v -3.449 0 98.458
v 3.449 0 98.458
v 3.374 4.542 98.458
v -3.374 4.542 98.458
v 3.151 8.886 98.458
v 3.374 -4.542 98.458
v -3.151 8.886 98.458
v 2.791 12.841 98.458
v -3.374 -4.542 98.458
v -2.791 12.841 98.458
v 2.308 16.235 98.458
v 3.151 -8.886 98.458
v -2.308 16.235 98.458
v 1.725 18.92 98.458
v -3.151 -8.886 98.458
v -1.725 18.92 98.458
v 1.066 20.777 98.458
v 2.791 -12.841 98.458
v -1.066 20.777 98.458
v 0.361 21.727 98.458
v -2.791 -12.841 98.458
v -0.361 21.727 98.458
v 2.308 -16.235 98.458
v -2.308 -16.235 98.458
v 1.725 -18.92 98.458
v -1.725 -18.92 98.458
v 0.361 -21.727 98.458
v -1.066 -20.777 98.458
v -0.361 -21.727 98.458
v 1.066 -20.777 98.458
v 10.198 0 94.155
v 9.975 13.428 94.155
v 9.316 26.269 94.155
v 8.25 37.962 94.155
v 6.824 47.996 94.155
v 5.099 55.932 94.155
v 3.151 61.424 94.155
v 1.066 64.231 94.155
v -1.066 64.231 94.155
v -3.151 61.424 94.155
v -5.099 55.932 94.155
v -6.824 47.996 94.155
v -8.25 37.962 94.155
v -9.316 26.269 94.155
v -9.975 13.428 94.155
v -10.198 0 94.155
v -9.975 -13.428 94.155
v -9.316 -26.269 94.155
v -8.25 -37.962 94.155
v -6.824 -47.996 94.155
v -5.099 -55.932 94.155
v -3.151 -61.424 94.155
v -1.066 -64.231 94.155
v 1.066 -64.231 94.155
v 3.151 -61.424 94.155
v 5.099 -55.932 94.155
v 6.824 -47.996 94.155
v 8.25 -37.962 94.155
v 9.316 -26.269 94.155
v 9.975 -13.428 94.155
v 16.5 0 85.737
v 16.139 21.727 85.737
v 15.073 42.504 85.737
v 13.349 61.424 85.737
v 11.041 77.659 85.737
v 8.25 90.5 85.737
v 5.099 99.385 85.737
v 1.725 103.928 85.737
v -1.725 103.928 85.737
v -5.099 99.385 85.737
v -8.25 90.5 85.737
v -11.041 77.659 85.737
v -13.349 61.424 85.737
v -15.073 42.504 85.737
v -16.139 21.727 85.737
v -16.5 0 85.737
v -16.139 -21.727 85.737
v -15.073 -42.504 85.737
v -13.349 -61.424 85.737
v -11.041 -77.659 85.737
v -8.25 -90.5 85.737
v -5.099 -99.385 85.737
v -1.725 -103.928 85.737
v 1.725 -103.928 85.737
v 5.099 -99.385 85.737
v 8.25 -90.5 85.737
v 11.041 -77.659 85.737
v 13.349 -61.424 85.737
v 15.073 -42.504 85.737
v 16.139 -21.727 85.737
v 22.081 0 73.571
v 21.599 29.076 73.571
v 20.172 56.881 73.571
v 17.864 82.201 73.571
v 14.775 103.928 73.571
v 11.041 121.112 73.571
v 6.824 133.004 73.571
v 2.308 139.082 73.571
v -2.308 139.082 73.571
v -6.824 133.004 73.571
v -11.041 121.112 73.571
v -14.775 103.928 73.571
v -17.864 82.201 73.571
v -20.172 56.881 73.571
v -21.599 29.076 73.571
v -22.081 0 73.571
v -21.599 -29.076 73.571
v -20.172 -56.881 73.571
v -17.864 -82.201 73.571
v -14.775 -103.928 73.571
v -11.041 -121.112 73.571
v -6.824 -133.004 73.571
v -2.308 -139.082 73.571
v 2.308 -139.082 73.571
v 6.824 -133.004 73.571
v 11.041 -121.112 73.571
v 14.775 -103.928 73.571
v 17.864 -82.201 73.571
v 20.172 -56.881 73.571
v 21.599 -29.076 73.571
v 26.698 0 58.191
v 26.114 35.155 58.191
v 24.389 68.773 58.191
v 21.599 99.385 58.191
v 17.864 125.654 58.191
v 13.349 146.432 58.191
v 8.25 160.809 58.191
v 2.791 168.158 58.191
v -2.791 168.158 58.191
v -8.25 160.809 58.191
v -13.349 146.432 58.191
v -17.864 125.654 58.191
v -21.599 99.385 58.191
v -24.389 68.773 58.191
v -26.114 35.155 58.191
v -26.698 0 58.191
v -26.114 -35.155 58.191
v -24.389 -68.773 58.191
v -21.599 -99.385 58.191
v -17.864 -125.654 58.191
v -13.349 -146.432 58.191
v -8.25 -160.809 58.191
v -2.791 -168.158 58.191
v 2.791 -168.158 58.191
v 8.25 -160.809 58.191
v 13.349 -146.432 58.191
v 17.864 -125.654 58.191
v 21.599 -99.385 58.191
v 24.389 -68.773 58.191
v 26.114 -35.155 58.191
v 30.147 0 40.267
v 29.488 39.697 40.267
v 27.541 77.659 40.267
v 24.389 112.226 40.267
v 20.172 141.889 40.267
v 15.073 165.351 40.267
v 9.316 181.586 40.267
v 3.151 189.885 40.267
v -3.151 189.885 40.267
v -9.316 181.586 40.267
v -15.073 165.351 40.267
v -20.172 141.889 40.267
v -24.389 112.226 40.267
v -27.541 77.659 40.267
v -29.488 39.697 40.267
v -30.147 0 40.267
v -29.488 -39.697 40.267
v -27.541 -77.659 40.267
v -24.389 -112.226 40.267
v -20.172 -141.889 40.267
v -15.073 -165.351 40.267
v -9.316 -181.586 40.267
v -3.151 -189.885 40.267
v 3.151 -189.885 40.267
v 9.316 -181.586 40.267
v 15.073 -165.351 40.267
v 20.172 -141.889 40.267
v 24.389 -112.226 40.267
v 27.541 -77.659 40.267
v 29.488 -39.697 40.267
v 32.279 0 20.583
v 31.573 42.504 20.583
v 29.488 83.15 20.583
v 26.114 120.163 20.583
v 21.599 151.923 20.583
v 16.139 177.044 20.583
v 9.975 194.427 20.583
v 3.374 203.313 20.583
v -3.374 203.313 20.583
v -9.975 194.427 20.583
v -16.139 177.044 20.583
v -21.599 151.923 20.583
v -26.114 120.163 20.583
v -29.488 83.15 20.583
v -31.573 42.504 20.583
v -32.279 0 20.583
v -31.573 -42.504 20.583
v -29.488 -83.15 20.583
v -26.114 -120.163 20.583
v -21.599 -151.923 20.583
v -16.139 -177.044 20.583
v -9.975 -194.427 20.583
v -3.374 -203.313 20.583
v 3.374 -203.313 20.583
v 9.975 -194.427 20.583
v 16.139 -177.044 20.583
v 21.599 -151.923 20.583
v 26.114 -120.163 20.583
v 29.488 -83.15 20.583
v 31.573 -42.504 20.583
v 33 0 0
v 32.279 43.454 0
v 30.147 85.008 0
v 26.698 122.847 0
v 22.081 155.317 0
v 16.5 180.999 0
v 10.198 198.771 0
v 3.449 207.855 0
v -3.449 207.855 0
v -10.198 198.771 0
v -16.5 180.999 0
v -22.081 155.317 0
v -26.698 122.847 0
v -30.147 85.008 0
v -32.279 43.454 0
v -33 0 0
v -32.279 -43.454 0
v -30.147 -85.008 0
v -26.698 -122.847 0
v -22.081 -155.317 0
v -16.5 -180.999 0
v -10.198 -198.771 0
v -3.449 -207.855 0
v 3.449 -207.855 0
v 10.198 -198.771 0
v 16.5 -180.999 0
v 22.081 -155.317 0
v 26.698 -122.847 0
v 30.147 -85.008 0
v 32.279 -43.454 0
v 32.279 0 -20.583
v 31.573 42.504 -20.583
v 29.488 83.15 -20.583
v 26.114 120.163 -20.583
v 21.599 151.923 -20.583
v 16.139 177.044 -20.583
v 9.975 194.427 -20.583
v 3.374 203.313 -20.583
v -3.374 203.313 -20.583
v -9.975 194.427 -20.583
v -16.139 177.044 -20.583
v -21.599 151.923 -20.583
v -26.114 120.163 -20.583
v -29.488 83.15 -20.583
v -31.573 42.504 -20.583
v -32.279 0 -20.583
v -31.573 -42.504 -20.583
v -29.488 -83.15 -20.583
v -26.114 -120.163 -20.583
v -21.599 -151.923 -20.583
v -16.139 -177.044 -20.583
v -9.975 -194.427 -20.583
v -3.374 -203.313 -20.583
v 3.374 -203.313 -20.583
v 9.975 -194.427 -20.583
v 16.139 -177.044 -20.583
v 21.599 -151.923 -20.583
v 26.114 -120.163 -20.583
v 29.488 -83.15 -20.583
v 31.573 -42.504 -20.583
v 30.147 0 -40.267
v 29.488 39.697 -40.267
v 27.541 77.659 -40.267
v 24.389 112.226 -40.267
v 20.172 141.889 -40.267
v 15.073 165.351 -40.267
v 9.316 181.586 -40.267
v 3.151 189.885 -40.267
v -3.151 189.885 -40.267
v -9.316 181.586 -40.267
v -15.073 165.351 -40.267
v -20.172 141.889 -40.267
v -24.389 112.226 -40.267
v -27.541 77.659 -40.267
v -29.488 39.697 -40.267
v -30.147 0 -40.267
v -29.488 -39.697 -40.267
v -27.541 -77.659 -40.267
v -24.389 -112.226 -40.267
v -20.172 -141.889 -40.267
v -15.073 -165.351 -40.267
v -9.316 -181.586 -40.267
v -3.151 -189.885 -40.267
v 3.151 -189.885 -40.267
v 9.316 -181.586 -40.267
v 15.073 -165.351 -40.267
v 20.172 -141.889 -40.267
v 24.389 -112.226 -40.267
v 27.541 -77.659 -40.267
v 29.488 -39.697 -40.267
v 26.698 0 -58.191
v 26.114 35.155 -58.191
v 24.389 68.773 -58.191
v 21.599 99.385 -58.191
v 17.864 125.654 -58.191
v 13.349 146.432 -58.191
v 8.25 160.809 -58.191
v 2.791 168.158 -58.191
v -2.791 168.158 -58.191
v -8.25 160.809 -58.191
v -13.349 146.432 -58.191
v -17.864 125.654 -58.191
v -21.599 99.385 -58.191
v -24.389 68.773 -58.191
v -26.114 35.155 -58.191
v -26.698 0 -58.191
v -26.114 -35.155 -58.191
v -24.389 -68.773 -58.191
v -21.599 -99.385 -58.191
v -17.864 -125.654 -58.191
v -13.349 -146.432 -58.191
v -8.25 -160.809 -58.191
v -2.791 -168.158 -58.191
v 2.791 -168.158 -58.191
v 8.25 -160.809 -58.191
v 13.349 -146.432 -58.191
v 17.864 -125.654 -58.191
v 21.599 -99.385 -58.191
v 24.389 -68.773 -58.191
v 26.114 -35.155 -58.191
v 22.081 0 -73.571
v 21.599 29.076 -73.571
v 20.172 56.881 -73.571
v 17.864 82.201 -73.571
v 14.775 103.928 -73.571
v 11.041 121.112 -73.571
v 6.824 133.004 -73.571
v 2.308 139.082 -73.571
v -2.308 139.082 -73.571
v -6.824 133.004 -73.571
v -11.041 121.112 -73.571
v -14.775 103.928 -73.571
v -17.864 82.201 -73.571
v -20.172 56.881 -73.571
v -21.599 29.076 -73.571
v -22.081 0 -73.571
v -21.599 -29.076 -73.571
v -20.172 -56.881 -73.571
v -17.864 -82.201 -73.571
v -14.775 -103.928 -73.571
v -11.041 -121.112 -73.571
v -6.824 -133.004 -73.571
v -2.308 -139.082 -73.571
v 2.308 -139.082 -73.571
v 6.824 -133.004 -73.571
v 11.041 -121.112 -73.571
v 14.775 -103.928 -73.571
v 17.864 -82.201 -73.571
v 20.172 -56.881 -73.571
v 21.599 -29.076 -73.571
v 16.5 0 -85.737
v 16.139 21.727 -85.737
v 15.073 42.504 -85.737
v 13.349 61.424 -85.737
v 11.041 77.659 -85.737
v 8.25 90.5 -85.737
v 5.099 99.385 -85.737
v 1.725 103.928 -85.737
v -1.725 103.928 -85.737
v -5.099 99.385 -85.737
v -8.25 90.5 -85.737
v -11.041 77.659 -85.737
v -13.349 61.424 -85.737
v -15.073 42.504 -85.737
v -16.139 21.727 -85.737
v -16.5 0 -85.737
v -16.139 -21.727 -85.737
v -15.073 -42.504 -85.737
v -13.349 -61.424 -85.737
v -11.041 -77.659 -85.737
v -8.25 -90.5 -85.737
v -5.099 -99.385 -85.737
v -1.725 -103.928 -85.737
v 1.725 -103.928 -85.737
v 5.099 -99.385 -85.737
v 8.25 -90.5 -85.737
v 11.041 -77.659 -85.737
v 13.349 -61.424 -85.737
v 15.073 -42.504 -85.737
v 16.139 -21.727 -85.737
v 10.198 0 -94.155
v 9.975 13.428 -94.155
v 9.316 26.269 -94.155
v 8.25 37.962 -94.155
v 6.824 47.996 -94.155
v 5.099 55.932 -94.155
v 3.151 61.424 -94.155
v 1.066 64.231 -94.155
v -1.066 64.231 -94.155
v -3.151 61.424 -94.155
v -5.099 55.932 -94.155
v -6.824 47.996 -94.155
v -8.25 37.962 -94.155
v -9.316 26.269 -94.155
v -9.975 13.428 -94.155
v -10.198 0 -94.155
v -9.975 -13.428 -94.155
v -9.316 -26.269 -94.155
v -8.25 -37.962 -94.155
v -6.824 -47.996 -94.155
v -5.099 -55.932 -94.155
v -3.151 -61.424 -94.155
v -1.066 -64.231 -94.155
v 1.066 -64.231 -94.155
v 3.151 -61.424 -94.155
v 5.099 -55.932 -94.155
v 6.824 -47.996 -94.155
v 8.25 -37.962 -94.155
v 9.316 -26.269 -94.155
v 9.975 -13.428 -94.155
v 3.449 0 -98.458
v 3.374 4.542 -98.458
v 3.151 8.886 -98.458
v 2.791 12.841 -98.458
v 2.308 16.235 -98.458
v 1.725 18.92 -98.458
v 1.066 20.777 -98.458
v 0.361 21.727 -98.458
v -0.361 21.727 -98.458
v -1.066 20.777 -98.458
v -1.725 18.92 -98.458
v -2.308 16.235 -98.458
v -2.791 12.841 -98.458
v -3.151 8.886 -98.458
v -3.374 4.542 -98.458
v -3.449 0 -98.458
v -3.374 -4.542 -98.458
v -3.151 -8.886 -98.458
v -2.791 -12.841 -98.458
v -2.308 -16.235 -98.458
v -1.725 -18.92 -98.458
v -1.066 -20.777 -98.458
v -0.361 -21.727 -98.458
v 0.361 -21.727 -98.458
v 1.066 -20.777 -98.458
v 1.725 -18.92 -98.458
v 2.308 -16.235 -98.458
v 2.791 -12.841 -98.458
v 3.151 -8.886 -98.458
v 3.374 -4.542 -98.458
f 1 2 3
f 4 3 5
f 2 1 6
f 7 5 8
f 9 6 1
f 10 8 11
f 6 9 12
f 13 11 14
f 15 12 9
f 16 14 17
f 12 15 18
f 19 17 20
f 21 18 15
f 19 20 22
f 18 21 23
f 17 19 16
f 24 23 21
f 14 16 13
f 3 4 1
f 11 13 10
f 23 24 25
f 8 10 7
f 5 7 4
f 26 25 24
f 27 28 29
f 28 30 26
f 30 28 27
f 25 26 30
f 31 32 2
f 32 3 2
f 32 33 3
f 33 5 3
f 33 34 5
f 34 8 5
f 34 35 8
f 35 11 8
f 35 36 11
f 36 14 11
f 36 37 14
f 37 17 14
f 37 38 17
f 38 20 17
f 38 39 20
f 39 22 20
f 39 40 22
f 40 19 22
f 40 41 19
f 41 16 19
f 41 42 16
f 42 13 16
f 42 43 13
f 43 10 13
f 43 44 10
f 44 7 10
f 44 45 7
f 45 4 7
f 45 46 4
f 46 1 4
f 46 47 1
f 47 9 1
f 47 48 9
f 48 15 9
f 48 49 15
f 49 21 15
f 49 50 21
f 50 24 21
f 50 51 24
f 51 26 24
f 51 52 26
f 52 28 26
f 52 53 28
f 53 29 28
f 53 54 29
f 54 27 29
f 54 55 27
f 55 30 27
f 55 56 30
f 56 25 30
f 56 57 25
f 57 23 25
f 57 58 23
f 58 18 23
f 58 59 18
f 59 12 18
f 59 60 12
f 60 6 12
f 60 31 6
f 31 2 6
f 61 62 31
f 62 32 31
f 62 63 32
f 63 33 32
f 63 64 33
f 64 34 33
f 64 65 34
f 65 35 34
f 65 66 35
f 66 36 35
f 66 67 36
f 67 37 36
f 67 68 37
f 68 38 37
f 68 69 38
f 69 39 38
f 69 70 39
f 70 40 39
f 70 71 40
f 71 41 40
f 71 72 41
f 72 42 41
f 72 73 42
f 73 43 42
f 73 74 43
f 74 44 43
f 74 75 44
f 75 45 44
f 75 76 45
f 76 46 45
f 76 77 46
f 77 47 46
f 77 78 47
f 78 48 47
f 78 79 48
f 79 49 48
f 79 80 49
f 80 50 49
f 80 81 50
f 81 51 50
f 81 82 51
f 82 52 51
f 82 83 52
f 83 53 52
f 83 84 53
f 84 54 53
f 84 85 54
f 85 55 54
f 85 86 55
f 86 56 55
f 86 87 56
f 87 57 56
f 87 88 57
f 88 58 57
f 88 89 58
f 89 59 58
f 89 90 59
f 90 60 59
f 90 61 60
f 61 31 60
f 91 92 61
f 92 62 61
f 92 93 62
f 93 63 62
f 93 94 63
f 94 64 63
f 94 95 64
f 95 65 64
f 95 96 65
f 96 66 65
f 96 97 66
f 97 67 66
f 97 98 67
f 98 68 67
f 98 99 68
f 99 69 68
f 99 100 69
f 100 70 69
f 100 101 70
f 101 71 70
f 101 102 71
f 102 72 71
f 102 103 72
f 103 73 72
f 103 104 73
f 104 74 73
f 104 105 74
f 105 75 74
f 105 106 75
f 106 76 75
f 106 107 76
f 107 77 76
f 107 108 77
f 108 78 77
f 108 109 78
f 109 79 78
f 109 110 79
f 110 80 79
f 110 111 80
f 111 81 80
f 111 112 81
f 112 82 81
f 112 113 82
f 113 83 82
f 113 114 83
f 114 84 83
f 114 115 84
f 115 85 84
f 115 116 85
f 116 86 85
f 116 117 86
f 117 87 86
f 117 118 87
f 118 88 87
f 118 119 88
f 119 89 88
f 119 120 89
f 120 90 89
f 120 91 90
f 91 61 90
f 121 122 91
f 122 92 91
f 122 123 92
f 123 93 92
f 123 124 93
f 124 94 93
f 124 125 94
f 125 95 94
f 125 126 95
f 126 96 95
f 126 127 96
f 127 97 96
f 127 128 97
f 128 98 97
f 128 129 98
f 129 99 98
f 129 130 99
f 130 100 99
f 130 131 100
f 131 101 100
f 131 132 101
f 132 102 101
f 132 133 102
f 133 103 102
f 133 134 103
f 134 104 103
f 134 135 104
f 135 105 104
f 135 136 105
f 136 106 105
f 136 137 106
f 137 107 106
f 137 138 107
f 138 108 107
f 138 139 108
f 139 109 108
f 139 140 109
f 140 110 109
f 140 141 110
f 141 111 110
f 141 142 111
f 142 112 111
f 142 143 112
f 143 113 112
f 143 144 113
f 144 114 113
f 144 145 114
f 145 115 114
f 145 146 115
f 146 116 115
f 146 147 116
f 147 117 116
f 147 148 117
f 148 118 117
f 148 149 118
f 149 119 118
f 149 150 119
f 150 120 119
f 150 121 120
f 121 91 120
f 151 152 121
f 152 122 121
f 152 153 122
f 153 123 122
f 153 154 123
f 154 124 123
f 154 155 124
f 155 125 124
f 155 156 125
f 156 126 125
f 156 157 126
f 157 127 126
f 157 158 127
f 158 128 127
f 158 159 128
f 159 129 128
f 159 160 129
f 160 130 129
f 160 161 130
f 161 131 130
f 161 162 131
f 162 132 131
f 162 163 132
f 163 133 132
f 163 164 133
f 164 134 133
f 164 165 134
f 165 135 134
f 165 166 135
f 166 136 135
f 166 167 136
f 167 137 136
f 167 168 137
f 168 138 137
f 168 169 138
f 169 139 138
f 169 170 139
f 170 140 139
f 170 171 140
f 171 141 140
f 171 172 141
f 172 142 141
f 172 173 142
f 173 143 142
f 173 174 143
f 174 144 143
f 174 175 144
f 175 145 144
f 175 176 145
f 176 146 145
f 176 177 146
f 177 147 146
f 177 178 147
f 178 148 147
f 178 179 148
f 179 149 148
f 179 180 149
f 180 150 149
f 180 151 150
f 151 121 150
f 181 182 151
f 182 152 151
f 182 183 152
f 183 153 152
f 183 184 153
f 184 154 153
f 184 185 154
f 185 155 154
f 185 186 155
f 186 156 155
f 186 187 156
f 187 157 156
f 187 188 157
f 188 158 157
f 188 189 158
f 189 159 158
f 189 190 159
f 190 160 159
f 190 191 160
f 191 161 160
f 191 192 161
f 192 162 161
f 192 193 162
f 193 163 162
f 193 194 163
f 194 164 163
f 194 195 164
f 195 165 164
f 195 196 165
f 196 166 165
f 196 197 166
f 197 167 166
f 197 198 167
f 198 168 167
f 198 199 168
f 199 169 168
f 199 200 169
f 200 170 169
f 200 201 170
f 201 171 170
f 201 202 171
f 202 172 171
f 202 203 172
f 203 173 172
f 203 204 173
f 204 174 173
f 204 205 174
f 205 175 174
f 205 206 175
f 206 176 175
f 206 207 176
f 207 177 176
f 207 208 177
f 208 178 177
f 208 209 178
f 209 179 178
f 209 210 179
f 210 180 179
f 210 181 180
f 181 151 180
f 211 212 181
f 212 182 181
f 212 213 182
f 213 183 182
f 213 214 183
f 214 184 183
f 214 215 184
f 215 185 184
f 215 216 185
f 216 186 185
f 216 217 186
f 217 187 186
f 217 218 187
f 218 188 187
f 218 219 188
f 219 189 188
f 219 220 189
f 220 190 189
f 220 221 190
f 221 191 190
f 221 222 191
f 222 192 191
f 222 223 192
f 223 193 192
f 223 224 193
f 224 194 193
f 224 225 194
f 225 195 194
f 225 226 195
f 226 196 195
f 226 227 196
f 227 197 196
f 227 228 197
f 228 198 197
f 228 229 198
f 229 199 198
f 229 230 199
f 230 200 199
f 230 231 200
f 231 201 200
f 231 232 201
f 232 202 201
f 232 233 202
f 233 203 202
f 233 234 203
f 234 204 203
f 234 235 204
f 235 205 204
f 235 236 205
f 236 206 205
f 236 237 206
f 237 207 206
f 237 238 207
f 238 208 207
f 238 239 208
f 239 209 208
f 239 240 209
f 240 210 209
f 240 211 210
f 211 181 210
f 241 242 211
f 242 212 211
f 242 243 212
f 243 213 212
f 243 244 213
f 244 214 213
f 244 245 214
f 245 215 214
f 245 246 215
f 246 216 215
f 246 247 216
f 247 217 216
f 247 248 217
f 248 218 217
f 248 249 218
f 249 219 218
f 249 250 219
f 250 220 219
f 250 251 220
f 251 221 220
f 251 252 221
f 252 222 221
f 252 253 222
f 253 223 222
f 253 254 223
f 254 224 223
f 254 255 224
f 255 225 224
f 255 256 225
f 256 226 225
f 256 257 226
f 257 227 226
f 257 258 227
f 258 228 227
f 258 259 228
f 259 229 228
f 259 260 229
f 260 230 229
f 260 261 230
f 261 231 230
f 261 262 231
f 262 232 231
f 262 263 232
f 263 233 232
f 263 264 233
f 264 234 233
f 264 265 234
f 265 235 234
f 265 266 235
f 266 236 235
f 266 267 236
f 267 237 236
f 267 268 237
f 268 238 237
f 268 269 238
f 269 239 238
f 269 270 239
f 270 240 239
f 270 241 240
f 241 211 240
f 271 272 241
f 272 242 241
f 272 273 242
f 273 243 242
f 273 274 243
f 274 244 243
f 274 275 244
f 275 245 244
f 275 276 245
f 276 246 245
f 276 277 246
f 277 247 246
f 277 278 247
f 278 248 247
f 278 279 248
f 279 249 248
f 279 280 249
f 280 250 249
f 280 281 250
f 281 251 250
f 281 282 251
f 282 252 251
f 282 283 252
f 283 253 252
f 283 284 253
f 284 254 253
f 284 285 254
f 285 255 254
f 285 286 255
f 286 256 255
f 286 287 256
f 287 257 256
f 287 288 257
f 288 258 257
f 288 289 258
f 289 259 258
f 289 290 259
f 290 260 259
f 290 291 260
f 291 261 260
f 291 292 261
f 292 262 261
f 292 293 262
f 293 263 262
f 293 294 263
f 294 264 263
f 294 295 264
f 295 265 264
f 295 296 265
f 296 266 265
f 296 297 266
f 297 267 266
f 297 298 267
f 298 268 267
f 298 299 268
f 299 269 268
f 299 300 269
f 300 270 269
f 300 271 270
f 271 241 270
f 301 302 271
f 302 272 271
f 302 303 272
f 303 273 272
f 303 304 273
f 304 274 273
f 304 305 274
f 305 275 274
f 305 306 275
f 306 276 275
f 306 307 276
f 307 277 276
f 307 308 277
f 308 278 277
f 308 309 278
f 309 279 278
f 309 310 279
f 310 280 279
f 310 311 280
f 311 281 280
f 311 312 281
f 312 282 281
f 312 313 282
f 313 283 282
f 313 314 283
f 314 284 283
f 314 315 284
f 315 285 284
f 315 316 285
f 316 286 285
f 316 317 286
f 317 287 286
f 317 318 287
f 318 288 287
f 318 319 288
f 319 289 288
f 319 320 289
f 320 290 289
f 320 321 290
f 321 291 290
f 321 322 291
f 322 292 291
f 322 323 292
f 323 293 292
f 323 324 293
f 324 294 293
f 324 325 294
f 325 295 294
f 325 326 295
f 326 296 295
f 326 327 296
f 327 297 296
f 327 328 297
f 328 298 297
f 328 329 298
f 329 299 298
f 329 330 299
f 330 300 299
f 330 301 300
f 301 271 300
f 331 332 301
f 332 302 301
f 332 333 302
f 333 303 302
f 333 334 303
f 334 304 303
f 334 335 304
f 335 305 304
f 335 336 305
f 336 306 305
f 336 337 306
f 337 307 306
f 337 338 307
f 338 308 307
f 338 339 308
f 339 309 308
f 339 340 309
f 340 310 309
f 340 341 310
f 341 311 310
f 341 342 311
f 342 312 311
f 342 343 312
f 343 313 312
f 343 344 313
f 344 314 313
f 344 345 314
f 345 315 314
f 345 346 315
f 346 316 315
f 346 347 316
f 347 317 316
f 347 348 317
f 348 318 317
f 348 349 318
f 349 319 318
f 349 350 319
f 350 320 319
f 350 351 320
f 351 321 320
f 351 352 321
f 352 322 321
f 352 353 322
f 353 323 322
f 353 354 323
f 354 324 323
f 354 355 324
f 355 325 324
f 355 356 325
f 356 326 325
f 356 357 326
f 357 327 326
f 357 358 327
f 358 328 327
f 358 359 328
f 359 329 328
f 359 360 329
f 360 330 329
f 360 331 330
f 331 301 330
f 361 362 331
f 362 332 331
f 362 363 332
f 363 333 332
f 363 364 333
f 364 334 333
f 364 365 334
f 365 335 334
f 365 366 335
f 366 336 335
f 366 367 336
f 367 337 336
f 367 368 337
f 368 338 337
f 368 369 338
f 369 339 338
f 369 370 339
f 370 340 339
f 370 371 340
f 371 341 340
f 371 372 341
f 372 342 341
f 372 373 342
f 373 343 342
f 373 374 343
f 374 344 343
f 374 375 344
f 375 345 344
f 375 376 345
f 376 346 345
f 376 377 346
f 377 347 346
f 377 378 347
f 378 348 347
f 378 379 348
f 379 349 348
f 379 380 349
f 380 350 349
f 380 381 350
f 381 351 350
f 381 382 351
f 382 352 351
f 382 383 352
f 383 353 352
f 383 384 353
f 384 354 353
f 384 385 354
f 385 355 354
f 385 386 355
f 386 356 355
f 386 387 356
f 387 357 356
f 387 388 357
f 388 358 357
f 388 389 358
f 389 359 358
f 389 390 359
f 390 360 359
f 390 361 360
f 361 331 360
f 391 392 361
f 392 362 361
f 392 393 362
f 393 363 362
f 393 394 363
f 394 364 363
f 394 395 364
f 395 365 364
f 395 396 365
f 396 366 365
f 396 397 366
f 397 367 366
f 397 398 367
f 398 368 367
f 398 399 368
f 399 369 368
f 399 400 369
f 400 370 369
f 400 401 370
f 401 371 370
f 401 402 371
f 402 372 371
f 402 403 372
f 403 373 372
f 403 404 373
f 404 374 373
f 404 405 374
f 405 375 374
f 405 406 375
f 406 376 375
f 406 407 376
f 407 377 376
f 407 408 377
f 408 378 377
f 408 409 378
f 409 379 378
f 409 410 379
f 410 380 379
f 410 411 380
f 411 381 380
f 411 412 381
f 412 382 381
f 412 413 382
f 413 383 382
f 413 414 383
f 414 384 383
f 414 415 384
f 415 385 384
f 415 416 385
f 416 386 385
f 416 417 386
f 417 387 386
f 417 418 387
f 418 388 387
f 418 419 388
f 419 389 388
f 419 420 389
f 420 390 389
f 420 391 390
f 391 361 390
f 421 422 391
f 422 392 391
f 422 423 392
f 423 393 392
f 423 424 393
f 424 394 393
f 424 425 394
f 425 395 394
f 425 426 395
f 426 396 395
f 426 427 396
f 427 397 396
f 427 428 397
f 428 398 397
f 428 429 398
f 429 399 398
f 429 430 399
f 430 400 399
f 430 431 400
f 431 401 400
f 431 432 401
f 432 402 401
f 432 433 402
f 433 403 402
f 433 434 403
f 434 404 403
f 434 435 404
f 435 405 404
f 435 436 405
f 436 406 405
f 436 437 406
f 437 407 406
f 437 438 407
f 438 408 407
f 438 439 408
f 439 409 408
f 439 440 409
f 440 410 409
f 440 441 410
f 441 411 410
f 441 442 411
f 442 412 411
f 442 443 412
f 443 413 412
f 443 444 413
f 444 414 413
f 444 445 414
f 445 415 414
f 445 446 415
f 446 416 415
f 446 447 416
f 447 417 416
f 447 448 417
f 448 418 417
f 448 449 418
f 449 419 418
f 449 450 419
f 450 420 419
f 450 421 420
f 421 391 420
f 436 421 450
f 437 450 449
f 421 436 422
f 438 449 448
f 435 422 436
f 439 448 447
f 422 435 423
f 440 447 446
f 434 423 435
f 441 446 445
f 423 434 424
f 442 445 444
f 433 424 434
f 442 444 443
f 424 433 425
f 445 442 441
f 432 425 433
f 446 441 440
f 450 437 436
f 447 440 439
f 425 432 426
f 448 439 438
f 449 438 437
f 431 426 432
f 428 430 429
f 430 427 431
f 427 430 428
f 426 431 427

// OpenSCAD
// Generated by SolidPython 1.0.1 on 2020-07-29 00:46:46


scale(v = [3, 19, 9]) {
	sphere(r = 11);
}
/***********************************************
*********      SolidPython code:      **********
************************************************
 
# import packages: SolidPython
from solid import *
from solid.utils import *
from itertools import chain, combinations, permutations


class Resize:

    def __init__(self, scad_file):
        self.scad_file = scad_file
        #self.scad_file = import_scad(scad_file)
        # cone/cylinder param:
        self.r1 = 0
        self.r2 = 0
        self.h = 0
        # rectangular prism param:
        self.w = 0
        self.l = 0
        # ellipse param:
        self.r = 0

    # import OpenScad code (file name corresponds to shape)


    # classify shape + parameters
    def assign(self, param1, param2, param3):
        if self.scad_file == 'cone.scad':
            self.r1 = param1
            self.r2 = param2
            self.h = param3
        elif self.scad_file == 'cylinder.scad':
            self.r1 = param1
            self.r2 = param2
            self.h = param3
        elif self.scad_file == 'rectangularPrism.scad':
            self.h = param1
            self.l = param2
            self.w = param3
        else:
            self.r = param1
            self.h = param2

    # resize parameters
    def iterate(self):
        x = range(3, 20, 2)
        i = 1
        if self.scad_file == 'cone.scad':
            tempList = list(permutations(x, 2))
            for temp in tempList:
                param1 = temp[0]
                param2 = temp[1]
                filepath = 'produced_scad_files/' + 'cone' + str(param1) + '_' + str(param2) + '_' + '.scad'
                scad_render_to_file(cylinder(h=param1, r1=param2, r2=0), filepath)

        elif self.scad_file == 'cylinder.scad':
            tempList = list(permutations(x, 3))
            for temp in tempList:
                param1 = temp[0]
                param2 = temp[1]
                filepath = 'produced_scad_files/' + 'cylinder' + str(param1) + '_' + str(param2) + '_' + '.scad'
                scad_render_to_file(cylinder(h=param1, r1=param2, r2=param2), filepath)

        elif self.scad_file == 'rectangularPrism.scad':
            tempList = list(permutations(x, 3))
            for temp in tempList:
                param1 = temp[0]
                param2 = temp[1]
                param3 = temp[2]
                filepath = 'produced_scad_files/' + 'rectangularPrism' + str(param1) + '_' + str(param2) + '_' + str(
                    param3) + '.scad'
                scad_render_to_file(cube(size=(param1, param2, param3)), filepath)

        elif self.scad_file == 'ellipse.scad':
            tempList = list(permutations(x, 4))
            for temp in tempList:
                param1 = temp[0]
                param2 = temp[1]
                param3 = temp[2]
                param4 = temp[3]
                filepath = 'produced_scad_files/' + 'ellipse' + str(param1) + '_' + str(param2) + '_' + str(param3) + '_' + str(param4) + '.scad'
                scad_render_to_file(scale([param1, param2, param3])(sphere(r=param4)), filepath)

    def render_to_scadfile(self):
        scad_render_to_file(scad, 'example.scad') 
 
************************************************/
